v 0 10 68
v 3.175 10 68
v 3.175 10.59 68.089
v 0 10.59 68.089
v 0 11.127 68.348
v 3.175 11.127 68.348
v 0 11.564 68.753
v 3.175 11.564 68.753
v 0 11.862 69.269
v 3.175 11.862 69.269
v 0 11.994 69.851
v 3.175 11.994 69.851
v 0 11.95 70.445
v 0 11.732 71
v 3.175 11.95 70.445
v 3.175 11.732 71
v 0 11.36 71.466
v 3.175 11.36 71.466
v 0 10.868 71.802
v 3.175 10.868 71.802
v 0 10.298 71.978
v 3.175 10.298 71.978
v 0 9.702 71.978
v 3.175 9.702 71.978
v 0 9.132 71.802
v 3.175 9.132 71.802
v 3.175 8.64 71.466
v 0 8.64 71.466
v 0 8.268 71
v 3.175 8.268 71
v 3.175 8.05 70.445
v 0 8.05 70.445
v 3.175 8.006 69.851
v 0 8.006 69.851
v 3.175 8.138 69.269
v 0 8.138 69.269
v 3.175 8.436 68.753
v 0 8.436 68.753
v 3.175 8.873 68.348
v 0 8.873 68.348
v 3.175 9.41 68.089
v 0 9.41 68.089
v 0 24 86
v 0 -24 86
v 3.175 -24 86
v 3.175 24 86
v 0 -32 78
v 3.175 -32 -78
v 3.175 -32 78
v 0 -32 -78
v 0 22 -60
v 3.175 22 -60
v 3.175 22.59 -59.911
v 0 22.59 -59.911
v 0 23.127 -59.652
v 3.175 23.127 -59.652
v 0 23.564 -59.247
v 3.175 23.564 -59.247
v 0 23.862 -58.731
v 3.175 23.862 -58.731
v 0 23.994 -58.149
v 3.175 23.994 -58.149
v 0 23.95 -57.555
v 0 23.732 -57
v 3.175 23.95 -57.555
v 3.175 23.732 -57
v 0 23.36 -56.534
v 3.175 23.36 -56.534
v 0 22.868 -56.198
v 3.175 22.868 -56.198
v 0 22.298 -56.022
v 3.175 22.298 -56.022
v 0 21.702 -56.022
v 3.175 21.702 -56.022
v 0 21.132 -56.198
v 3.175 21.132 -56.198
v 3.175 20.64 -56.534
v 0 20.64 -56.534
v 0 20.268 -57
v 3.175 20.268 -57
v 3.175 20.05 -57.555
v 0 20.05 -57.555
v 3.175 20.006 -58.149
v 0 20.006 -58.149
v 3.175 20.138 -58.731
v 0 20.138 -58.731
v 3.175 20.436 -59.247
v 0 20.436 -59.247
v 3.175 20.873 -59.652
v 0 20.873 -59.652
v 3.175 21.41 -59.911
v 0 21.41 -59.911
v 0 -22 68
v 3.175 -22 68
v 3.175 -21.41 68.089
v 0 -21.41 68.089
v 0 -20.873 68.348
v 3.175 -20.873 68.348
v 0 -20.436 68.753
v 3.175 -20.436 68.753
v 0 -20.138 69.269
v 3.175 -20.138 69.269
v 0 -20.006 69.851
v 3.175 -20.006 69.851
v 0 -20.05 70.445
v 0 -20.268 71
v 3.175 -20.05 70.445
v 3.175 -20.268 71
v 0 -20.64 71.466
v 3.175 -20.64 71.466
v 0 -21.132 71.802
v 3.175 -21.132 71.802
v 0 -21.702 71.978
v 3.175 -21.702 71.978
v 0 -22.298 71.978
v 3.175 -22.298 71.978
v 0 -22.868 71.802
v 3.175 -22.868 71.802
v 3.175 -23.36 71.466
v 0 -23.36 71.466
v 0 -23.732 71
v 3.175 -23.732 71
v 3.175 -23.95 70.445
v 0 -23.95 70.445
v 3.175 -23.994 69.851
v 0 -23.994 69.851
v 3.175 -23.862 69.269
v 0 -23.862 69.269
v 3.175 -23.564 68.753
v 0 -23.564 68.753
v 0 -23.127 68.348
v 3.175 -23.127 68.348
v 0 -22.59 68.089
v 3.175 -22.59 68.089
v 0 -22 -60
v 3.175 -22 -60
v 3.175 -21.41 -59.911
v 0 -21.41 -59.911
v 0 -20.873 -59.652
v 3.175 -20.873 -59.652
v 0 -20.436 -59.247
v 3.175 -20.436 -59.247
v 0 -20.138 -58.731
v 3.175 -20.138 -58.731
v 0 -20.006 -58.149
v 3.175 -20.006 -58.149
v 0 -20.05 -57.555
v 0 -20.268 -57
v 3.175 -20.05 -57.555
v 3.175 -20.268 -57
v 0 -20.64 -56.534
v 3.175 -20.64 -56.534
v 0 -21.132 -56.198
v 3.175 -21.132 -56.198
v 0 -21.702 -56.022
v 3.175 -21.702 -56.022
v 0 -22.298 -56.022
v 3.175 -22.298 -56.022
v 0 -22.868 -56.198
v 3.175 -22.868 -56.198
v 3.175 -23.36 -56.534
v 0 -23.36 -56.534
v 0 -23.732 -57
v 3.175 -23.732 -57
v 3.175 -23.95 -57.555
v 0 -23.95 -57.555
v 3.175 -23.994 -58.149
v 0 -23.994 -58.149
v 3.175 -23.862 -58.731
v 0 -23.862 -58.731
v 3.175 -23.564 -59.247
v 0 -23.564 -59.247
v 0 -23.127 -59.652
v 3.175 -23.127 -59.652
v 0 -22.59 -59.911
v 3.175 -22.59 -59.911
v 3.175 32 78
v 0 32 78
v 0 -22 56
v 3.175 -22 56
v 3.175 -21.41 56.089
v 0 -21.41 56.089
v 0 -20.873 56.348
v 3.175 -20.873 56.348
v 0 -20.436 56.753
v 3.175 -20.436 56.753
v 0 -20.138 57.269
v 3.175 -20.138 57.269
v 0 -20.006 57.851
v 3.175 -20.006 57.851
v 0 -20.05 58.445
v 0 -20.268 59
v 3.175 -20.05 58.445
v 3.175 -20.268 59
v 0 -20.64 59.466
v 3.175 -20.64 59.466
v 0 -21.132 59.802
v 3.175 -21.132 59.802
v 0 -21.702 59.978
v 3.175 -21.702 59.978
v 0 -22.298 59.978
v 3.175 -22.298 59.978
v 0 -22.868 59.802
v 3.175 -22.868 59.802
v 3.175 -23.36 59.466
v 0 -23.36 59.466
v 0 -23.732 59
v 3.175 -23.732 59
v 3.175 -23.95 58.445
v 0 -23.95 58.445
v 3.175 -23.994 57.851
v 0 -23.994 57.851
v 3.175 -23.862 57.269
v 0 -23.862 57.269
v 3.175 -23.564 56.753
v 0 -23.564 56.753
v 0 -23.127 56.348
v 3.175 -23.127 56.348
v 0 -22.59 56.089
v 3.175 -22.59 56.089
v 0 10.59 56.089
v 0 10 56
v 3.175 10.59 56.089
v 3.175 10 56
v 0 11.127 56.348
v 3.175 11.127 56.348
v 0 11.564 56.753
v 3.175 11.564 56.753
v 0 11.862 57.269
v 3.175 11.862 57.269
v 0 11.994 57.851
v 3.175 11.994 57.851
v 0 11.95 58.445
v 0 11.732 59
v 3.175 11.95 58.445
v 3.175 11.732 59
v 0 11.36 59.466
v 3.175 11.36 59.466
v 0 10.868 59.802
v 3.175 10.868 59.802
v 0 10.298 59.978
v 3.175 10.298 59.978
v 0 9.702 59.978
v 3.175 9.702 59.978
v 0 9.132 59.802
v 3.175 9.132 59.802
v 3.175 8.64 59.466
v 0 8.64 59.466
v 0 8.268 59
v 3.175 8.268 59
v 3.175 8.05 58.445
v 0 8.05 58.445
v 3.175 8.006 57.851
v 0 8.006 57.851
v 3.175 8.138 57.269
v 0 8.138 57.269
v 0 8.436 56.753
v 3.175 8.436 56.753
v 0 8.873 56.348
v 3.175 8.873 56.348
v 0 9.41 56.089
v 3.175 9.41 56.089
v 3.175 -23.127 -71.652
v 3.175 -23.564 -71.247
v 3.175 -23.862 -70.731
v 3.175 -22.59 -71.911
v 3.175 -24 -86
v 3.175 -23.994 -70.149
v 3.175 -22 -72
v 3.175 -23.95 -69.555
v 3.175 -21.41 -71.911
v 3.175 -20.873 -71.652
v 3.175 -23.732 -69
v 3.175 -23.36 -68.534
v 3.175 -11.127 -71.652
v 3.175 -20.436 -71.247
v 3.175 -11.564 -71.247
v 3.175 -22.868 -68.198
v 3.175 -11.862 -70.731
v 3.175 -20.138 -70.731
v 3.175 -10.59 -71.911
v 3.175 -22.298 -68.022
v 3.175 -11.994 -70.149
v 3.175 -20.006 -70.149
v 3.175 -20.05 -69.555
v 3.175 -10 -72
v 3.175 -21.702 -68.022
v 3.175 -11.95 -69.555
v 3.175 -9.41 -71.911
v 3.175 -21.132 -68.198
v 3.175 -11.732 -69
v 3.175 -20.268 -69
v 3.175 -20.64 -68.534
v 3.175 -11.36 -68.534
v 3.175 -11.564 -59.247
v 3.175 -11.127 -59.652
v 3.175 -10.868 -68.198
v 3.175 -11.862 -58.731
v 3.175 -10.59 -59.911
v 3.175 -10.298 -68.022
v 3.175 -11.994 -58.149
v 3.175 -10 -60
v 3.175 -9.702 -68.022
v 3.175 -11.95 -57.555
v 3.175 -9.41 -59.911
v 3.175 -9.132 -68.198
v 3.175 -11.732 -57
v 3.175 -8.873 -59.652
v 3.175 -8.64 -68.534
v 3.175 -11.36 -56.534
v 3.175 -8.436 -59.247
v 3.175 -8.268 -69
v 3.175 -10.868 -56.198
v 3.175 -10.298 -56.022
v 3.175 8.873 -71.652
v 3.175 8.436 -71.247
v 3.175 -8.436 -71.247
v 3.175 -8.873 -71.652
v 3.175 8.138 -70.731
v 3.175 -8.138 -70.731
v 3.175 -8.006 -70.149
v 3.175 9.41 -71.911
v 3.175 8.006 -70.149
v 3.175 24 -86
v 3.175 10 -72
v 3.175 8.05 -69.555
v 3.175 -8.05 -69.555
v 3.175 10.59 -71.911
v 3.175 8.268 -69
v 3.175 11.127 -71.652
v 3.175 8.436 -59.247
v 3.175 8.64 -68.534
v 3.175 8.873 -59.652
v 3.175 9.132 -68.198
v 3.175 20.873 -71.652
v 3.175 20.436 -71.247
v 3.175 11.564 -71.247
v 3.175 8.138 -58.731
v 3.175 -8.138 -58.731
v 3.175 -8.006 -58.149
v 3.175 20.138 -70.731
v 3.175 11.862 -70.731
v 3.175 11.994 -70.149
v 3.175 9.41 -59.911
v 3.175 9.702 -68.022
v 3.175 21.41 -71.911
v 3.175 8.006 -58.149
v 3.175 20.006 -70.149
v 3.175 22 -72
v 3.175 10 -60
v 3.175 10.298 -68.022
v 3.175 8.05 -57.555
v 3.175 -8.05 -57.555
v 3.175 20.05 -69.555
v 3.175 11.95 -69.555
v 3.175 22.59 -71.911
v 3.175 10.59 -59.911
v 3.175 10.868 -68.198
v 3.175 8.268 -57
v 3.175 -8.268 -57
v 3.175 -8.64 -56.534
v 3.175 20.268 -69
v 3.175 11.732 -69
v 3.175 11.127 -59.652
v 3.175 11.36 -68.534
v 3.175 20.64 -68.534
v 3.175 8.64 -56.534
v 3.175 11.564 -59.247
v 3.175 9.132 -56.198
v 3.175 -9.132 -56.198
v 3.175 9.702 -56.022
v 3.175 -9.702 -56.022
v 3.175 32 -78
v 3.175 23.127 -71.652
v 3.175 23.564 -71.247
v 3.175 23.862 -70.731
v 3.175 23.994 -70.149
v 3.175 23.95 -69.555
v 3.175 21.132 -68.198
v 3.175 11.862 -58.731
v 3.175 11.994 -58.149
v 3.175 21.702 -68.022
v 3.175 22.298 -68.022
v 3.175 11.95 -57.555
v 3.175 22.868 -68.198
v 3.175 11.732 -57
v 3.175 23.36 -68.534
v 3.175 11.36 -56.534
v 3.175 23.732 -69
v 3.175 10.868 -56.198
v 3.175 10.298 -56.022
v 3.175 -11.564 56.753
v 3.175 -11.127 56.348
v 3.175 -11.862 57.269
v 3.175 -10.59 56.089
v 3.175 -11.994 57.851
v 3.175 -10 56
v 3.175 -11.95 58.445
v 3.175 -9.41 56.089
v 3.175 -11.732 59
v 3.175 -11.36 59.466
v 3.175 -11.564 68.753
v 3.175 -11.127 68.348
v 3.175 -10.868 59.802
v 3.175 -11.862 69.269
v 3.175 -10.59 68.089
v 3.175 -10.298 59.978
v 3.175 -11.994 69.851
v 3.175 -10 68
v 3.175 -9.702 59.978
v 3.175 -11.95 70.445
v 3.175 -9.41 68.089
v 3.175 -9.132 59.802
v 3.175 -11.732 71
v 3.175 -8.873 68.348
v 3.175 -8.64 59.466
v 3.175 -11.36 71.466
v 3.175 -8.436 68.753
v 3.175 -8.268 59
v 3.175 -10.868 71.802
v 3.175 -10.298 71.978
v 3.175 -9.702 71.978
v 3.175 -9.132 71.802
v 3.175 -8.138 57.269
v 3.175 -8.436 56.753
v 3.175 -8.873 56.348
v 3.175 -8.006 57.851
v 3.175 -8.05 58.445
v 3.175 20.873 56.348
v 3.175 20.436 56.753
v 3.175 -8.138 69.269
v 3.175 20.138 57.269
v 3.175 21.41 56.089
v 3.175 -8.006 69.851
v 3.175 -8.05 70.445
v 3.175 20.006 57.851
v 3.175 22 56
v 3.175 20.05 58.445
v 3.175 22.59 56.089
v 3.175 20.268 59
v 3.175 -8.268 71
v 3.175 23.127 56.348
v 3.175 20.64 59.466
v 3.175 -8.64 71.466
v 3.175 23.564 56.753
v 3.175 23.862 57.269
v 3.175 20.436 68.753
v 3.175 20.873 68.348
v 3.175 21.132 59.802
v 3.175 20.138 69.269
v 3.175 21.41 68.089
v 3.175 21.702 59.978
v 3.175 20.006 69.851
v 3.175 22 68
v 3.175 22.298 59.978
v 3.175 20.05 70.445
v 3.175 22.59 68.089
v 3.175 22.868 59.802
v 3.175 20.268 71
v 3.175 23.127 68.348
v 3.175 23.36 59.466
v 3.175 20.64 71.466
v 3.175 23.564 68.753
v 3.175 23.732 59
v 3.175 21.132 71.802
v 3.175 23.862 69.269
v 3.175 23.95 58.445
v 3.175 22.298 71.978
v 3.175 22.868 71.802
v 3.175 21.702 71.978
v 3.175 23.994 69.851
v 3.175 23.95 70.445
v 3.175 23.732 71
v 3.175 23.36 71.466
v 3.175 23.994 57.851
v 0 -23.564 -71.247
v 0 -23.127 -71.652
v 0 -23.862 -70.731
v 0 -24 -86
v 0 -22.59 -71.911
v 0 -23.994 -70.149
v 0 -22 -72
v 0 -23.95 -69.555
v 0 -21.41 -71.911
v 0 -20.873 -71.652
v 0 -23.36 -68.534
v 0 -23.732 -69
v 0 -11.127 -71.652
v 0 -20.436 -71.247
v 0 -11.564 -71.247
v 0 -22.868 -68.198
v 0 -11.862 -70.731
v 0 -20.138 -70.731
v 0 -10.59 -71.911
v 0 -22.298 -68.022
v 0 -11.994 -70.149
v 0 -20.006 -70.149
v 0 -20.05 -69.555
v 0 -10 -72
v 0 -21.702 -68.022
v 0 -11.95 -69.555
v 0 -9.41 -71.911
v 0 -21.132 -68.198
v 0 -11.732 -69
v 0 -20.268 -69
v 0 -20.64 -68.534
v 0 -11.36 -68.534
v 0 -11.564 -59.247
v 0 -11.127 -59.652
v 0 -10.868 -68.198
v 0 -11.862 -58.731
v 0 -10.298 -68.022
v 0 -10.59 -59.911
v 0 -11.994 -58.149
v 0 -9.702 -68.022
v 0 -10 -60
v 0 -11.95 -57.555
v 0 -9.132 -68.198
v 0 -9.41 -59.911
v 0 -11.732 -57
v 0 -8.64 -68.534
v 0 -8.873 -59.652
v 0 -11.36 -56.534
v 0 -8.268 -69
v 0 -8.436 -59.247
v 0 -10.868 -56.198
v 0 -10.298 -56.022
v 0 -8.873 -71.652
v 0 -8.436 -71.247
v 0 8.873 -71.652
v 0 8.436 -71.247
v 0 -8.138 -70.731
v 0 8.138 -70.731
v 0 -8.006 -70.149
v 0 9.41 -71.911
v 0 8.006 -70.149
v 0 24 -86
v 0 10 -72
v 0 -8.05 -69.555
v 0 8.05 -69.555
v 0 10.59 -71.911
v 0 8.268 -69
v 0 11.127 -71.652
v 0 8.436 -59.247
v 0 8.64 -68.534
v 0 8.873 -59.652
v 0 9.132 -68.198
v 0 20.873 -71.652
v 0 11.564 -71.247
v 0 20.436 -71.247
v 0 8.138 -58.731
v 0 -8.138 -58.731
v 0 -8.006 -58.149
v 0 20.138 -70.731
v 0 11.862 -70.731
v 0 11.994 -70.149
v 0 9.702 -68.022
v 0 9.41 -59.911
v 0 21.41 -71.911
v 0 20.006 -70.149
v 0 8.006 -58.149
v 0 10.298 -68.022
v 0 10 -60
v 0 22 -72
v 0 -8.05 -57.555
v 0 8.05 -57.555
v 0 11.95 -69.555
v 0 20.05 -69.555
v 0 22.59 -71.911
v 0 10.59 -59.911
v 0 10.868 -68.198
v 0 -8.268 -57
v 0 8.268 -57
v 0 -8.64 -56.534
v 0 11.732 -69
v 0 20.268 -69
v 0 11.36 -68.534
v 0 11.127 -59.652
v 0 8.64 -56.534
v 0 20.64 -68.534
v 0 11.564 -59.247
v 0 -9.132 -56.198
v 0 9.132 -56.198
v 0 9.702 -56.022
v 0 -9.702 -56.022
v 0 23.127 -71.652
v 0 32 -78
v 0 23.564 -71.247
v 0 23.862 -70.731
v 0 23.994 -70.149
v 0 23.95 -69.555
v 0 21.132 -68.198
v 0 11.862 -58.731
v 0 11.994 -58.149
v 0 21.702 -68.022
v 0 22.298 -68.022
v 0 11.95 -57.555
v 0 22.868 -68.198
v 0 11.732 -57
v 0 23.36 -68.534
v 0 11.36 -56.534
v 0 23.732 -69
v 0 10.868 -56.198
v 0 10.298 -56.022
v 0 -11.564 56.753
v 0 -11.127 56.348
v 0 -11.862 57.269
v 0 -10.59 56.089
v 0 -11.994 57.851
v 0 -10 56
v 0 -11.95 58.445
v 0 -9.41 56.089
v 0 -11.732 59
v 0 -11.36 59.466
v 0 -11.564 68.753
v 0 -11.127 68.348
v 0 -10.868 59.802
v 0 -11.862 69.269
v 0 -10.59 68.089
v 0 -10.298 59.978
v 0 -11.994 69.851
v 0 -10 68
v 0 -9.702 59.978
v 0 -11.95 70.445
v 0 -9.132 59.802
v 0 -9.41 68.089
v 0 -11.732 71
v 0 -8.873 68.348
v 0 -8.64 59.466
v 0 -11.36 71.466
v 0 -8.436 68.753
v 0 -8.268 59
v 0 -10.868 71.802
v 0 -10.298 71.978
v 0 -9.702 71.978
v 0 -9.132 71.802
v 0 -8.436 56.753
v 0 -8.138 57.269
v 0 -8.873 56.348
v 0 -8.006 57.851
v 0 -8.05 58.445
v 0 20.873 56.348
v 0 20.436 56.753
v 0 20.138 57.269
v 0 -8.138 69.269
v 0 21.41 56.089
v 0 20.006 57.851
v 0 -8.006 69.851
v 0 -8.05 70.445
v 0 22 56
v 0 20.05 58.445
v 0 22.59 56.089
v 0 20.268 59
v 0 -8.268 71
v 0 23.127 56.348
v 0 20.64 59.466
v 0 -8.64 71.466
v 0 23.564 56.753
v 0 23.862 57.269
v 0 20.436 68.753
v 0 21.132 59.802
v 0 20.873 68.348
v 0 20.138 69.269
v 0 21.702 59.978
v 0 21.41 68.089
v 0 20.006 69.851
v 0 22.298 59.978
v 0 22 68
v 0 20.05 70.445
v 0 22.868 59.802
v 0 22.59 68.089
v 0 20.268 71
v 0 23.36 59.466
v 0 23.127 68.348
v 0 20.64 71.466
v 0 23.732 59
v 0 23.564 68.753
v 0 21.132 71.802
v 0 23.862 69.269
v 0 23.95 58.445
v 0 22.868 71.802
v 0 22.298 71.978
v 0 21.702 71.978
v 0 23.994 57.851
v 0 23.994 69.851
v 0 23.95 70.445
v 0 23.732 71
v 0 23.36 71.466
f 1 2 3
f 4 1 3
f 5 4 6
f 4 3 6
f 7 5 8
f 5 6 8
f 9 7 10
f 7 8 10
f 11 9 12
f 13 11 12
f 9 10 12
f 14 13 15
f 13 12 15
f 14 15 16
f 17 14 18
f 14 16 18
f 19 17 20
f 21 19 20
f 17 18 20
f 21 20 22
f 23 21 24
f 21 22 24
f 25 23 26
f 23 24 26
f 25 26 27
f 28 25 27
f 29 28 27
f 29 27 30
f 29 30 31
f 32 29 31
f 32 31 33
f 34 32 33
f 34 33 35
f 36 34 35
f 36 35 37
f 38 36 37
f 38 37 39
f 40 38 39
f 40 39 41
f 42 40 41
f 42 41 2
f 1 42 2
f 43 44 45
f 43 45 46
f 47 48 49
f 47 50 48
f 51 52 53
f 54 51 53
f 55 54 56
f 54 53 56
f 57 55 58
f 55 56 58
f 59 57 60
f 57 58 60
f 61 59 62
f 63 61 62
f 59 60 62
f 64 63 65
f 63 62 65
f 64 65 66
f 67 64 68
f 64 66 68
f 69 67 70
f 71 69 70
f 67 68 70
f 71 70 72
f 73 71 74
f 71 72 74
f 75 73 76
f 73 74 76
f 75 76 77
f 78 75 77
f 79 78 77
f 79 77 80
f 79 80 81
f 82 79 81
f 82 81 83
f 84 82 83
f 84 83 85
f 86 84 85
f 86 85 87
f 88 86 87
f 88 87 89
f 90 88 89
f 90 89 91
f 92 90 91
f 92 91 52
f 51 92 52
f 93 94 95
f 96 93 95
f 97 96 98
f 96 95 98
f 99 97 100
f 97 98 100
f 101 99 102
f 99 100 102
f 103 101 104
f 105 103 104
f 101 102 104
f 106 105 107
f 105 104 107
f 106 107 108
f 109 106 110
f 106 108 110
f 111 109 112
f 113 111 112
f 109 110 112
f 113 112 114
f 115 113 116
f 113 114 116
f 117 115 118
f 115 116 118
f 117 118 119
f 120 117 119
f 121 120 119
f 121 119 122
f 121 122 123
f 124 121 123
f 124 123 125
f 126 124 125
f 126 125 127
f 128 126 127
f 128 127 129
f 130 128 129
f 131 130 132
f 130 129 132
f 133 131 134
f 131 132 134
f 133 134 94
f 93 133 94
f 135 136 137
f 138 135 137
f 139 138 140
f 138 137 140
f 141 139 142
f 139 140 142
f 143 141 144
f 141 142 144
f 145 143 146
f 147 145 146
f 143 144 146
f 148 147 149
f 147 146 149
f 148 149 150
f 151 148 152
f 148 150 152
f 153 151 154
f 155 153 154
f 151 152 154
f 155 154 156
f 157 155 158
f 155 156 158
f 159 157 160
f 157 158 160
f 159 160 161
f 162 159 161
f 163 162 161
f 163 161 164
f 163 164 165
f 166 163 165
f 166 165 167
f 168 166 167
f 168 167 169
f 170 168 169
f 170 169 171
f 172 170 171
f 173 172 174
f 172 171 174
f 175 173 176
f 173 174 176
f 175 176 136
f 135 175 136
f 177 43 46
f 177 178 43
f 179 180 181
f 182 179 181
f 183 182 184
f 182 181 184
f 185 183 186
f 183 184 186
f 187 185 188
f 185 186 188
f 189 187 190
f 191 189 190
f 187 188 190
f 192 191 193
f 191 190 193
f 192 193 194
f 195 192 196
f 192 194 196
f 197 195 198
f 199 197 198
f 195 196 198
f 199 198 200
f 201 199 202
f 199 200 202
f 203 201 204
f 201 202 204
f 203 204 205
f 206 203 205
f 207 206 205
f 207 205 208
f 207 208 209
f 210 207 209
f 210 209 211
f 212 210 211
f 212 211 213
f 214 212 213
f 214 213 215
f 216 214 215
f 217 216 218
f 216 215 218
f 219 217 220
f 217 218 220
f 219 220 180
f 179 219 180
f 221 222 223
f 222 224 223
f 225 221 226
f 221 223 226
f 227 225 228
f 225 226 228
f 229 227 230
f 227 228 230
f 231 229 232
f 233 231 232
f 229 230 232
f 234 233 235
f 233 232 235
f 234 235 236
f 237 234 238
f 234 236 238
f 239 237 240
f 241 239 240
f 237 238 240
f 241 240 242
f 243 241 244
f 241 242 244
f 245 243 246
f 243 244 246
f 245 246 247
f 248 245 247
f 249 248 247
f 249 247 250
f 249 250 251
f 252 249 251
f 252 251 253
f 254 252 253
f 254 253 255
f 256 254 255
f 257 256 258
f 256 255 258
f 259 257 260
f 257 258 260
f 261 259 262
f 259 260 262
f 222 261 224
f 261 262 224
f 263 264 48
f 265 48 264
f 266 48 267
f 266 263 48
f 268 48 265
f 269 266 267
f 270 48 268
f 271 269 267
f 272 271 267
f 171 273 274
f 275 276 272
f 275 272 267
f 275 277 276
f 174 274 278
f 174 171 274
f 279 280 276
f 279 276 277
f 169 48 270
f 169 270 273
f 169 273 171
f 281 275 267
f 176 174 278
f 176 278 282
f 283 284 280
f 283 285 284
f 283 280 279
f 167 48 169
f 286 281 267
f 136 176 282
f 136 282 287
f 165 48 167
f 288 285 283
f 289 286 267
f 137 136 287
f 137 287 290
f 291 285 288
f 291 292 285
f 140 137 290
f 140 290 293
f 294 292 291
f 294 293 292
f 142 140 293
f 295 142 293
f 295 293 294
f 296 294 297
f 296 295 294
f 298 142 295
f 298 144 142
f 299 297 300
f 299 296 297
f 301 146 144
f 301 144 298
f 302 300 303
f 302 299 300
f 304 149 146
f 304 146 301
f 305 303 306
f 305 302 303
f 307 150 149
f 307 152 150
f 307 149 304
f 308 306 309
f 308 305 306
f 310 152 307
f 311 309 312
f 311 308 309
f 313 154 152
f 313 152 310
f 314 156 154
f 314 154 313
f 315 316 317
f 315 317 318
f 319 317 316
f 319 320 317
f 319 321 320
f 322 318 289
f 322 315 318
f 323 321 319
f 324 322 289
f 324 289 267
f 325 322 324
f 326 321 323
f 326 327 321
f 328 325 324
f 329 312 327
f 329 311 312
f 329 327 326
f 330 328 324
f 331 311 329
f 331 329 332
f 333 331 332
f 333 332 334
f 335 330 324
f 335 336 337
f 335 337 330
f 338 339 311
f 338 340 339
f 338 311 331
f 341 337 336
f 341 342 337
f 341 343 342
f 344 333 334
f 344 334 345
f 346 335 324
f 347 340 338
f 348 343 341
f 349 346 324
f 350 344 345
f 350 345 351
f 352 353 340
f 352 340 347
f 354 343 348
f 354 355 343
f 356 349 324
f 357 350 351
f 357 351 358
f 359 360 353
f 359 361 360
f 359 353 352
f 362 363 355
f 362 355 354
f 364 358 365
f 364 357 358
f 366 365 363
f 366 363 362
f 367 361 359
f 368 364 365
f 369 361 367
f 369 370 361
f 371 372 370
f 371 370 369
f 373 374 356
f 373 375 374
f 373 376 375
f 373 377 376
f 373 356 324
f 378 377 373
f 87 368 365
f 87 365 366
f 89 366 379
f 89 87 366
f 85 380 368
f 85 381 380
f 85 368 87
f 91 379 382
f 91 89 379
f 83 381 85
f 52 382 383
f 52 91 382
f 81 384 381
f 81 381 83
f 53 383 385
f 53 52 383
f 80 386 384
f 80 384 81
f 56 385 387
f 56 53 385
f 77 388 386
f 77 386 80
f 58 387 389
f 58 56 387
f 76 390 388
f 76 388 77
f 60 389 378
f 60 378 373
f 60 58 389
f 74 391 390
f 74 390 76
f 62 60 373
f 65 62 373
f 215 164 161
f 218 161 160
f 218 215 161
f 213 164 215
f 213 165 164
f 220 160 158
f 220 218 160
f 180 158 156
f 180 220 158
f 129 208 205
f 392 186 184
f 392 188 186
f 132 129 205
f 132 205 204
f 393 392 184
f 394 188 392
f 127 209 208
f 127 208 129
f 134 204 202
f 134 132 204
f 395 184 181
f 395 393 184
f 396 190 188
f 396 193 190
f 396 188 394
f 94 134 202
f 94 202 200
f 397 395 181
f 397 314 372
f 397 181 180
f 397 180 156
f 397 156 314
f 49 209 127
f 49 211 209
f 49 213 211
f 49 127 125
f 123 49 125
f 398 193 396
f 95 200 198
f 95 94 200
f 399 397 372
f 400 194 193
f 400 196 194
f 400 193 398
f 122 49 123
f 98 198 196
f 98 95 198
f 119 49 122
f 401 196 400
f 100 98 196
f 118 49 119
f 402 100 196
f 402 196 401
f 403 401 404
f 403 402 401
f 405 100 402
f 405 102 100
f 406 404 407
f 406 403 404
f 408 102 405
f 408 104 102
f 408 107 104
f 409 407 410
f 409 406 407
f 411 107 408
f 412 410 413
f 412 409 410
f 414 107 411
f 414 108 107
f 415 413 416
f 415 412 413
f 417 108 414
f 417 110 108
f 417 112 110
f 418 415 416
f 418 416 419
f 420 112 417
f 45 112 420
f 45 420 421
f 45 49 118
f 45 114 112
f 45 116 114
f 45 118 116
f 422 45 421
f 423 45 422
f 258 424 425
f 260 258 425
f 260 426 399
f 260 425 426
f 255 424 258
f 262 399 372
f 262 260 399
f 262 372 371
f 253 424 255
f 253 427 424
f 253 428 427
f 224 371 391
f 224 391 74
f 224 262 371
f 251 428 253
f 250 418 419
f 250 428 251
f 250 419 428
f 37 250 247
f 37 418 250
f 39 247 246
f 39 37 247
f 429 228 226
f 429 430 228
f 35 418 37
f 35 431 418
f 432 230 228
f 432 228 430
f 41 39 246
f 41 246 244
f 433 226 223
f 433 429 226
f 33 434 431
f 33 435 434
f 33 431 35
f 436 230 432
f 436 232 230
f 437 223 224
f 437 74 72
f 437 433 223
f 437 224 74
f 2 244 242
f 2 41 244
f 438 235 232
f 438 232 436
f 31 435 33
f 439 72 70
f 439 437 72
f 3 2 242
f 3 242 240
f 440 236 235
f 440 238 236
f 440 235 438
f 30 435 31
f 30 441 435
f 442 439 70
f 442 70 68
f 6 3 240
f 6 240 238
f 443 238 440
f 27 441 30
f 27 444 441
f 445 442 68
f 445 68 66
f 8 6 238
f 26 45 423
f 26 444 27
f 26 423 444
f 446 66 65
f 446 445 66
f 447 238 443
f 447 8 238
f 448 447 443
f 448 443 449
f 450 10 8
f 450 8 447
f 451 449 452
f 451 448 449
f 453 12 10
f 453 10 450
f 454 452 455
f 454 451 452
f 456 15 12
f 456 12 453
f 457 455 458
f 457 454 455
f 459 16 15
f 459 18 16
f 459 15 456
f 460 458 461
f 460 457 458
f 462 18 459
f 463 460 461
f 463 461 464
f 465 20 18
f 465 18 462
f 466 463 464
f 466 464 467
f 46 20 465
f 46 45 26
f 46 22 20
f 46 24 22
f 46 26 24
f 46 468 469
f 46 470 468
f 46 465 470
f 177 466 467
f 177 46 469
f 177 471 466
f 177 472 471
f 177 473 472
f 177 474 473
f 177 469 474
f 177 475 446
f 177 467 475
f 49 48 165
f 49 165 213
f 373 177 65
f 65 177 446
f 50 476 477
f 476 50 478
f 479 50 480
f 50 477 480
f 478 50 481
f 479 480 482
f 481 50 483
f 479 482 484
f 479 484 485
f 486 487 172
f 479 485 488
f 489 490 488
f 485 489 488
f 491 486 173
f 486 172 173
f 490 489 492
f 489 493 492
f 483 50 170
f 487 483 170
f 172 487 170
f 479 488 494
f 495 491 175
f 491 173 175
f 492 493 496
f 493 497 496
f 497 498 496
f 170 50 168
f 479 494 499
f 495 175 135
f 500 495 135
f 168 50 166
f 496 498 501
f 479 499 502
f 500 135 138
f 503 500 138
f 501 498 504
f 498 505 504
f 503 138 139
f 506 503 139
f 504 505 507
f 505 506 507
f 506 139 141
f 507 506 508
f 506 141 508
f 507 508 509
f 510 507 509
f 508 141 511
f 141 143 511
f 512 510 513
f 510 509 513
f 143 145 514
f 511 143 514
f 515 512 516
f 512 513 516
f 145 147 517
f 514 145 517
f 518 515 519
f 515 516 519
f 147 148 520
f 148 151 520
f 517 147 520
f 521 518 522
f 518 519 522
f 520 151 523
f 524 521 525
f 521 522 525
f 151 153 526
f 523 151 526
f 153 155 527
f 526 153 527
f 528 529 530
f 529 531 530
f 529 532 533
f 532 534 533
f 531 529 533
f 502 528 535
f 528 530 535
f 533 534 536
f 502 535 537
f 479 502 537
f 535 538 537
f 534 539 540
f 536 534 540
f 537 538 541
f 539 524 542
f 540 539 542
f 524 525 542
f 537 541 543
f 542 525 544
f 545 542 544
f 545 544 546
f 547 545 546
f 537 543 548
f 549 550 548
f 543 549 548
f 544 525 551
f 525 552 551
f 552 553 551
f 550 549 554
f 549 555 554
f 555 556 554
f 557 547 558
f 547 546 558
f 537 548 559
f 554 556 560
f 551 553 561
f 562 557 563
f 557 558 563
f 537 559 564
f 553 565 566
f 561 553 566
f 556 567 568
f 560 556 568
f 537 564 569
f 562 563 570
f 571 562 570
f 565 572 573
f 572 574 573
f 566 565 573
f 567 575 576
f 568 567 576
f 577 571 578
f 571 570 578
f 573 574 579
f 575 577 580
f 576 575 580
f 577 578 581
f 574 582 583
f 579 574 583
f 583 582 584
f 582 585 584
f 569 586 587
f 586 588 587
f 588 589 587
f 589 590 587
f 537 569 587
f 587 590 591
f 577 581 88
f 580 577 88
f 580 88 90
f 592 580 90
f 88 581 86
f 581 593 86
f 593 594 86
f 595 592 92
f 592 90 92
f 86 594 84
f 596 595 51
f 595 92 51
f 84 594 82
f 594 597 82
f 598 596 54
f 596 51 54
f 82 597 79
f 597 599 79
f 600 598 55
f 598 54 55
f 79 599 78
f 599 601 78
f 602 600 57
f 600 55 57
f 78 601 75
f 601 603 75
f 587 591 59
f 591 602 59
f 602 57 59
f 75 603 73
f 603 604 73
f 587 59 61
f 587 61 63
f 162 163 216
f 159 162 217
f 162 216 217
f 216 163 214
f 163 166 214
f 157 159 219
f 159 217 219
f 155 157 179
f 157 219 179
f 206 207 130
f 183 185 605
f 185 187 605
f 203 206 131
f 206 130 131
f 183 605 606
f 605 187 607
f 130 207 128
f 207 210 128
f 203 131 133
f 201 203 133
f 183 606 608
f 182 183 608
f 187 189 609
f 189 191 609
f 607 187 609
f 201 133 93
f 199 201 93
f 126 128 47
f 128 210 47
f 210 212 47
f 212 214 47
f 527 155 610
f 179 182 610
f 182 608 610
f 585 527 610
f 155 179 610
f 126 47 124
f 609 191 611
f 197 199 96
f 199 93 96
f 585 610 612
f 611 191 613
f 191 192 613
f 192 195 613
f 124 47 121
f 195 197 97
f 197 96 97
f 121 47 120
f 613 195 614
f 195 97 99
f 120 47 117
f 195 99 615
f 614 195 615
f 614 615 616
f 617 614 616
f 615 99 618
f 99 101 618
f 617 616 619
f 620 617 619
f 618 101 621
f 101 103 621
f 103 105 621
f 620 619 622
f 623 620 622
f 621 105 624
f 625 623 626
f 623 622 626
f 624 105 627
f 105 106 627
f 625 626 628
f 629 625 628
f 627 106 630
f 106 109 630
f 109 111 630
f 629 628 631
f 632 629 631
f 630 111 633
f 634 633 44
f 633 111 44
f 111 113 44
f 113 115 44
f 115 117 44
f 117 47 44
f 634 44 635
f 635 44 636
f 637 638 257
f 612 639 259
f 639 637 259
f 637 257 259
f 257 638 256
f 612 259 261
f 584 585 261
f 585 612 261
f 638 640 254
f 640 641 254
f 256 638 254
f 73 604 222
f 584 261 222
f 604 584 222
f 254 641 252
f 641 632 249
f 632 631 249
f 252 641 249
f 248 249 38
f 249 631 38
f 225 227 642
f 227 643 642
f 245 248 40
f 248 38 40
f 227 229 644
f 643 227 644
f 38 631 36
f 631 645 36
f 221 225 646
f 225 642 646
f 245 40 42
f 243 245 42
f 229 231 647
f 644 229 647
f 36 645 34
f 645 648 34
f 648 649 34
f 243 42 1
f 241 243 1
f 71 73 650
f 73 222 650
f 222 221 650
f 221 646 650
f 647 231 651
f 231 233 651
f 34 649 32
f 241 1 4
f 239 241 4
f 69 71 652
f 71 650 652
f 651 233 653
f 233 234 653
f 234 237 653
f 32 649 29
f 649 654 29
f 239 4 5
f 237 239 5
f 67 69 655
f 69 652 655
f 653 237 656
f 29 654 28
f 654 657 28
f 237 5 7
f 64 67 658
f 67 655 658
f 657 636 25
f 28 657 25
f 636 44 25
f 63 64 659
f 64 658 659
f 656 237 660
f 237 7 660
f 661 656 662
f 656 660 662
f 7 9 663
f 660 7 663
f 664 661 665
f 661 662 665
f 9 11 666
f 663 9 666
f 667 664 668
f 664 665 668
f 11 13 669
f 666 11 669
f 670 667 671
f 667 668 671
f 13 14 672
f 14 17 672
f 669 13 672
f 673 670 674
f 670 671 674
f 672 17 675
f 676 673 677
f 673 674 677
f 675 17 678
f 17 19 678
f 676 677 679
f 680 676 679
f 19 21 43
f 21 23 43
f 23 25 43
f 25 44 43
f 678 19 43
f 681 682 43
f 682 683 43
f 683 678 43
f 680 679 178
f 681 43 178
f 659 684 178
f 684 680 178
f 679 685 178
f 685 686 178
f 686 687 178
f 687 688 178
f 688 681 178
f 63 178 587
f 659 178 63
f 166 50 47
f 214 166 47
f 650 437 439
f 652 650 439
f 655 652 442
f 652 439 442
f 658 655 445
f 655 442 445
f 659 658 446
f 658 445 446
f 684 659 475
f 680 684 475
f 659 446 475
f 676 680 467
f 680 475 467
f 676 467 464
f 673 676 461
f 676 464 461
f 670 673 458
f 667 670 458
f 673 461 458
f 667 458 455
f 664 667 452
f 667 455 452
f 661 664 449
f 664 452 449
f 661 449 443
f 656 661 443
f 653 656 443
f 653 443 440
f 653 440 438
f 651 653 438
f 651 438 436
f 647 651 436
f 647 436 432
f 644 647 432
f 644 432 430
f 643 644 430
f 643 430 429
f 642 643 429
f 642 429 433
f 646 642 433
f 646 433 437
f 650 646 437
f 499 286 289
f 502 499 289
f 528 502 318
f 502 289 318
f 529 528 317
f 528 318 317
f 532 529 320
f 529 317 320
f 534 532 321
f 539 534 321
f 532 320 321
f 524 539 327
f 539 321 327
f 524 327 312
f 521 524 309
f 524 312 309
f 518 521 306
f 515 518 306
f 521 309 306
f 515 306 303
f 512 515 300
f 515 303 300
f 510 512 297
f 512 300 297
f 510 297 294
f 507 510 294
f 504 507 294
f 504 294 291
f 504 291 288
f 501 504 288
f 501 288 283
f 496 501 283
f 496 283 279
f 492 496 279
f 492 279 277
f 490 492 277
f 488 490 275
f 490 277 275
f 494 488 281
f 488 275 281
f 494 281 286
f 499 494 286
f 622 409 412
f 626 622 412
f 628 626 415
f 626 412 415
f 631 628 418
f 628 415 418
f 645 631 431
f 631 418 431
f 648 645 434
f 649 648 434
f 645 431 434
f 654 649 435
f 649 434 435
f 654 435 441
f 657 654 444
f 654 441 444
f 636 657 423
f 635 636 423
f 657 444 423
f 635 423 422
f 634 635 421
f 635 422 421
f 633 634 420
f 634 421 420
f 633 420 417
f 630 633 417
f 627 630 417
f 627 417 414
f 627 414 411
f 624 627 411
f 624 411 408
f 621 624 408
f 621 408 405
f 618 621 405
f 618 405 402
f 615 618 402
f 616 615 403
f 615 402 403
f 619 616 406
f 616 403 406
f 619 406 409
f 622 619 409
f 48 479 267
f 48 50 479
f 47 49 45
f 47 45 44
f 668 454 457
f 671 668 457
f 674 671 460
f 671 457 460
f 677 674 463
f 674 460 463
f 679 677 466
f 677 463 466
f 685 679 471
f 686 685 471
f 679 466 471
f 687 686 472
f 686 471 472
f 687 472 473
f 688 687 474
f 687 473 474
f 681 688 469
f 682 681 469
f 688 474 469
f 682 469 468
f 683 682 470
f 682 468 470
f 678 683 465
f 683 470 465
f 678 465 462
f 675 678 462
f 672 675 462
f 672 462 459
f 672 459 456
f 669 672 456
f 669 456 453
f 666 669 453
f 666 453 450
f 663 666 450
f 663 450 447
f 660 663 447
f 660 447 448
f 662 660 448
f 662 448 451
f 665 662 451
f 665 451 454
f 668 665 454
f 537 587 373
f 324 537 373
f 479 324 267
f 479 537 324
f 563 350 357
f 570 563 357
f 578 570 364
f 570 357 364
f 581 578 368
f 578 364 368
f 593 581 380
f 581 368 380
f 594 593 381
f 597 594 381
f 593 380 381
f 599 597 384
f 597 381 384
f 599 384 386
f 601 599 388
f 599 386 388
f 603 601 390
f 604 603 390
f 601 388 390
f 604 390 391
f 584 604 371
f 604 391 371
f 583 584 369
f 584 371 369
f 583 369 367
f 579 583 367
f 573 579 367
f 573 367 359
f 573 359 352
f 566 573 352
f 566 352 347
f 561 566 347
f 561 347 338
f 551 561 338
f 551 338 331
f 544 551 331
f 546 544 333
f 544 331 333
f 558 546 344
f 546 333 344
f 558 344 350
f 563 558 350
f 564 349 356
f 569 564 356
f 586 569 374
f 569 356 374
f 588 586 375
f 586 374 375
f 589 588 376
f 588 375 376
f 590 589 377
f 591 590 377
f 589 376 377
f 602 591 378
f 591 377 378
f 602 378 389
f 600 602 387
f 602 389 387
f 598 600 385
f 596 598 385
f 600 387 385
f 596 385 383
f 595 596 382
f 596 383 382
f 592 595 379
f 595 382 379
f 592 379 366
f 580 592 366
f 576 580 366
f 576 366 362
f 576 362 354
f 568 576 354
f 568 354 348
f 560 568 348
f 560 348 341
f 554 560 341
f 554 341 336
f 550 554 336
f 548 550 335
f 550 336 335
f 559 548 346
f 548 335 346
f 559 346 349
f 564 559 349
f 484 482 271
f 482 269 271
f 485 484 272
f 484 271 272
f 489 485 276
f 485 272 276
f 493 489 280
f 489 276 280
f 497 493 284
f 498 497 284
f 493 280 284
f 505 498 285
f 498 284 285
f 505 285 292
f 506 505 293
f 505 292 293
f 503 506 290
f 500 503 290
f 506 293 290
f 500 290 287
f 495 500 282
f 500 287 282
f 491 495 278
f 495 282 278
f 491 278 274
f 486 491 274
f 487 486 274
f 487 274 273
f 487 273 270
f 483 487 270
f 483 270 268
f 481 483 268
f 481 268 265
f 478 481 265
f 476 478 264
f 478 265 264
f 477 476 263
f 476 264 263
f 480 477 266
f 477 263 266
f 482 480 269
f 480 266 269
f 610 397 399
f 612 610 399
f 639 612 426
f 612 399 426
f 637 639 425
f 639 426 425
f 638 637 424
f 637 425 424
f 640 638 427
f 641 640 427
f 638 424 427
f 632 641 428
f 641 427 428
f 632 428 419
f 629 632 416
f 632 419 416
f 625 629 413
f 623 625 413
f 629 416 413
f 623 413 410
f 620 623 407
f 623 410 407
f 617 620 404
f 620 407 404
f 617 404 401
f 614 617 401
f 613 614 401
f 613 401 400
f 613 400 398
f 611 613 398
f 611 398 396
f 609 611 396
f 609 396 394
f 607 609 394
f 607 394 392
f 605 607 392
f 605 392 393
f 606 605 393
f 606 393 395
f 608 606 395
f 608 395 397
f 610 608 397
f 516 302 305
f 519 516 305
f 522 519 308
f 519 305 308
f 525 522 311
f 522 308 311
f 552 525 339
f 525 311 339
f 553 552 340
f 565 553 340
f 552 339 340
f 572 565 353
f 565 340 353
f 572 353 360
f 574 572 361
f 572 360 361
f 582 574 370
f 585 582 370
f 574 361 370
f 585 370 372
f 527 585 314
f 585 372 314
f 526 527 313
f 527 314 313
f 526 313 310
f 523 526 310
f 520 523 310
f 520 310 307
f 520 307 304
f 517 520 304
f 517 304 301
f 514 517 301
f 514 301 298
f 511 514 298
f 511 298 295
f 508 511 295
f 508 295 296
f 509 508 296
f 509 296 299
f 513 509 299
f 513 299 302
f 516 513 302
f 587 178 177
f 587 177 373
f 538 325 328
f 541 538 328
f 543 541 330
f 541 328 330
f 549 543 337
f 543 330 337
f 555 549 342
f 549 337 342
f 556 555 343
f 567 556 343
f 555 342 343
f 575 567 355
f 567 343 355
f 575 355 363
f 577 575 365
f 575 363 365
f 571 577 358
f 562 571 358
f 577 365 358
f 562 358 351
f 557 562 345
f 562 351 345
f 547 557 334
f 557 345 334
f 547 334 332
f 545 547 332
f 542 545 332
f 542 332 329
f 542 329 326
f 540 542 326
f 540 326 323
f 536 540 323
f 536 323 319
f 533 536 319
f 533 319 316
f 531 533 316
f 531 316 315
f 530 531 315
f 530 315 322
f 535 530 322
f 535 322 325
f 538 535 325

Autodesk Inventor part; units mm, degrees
ref_plane "YZ Plane" through (0, 0, 0) normal (1, 0, 0) x (0, 1, 0)
ref_plane "XZ Plane" through (0, 0, 0) normal (0, 1, 0) x (-1, 0, 0)
ref_plane "XY Plane" through (0, 0, 0) normal (0, 0, 1) x (1, 0, 0)
sketch "Sketch1" plane through (0, 0, 0) normal (1, 0, 0) x (0, 1, 0)
  line L0 (-32, 86) -> (32, 86)
  line L1 (32, 86) -> (32, -86)
  line L2 (32, -86) -> (-32, -86)
  line L3 (-32, -86) -> (-32, 86)
  line L4 (-32, 86) -> (32, -86) construction
  line L5 (32, 86) -> (-32, -86) construction
  point P0 (0, 0)
  dimension "d0" = 64
  dimension "d1" = 172
extrude "Extrusion1" add sketch "Sketch1" along normal blind 3.175
sketch "Sketch2" plane through (3.175, 0, 0) normal (1, 0, 0) x (0, 0, -1)
  circle A0 centre (-64, -16) radius 2.5 construction
  circle A1 centre (-70, -22) radius 2
  circle A2 centre (-58, -22) radius 2
  circle A3 centre (-58, -10) radius 2
  circle A4 centre (-70, -10) radius 2
  line L0 (-86, 32) -> (-86, -32) construction
  line L1 (-86, 0) -> (86, 0) construction
  line L2 (86, -32) -> (86, 32) construction
  line L3 (86, 32) -> (-86, 32) construction
  line L4 (0, 32) -> (0, -32) construction
  line L5 (-86, -32) -> (86, -32) construction
  circle A5 centre (-64, 16) radius 2.5 construction
  circle A6 centre (-70, 22) radius 2
  circle A7 centre (-58, 22) radius 2
  circle A8 centre (-58, 10) radius 2
  circle A9 centre (-70, 10) radius 2
  circle A10 centre (64, -16) radius 2.5 construction
  circle A11 centre (70, -22) radius 2
  circle A12 centre (58, -22) radius 2
  circle A13 centre (58, -10) radius 2
  circle A14 centre (70, -10) radius 2
  circle A15 centre (64, 16) radius 2.5 construction
  circle A16 centre (70, 22) radius 2
  circle A17 centre (58, 22) radius 2
  circle A18 centre (58, 10) radius 2
  circle A19 centre (70, 10) radius 2
  point P0 (0, 0)
  dimension "d4" = 5
  dimension "d5" = 64
  dimension "d6" = 16
  dimension "d7" = 4
  dimension "d8" = 6
  dimension "d9" = 6
  dimension "d12" = 360
chamfer "Chamfer1" distance 8 angle 45 4 edges at (1.5875, 32, 86) (1.5875, -32, 86) (1.5875, -32, -86) (1.5875, 32, -86)
extrude "Extrusion2" cut sketch "Sketch2" against normal through all
properties part number "ArmBaseSupportPlates"
